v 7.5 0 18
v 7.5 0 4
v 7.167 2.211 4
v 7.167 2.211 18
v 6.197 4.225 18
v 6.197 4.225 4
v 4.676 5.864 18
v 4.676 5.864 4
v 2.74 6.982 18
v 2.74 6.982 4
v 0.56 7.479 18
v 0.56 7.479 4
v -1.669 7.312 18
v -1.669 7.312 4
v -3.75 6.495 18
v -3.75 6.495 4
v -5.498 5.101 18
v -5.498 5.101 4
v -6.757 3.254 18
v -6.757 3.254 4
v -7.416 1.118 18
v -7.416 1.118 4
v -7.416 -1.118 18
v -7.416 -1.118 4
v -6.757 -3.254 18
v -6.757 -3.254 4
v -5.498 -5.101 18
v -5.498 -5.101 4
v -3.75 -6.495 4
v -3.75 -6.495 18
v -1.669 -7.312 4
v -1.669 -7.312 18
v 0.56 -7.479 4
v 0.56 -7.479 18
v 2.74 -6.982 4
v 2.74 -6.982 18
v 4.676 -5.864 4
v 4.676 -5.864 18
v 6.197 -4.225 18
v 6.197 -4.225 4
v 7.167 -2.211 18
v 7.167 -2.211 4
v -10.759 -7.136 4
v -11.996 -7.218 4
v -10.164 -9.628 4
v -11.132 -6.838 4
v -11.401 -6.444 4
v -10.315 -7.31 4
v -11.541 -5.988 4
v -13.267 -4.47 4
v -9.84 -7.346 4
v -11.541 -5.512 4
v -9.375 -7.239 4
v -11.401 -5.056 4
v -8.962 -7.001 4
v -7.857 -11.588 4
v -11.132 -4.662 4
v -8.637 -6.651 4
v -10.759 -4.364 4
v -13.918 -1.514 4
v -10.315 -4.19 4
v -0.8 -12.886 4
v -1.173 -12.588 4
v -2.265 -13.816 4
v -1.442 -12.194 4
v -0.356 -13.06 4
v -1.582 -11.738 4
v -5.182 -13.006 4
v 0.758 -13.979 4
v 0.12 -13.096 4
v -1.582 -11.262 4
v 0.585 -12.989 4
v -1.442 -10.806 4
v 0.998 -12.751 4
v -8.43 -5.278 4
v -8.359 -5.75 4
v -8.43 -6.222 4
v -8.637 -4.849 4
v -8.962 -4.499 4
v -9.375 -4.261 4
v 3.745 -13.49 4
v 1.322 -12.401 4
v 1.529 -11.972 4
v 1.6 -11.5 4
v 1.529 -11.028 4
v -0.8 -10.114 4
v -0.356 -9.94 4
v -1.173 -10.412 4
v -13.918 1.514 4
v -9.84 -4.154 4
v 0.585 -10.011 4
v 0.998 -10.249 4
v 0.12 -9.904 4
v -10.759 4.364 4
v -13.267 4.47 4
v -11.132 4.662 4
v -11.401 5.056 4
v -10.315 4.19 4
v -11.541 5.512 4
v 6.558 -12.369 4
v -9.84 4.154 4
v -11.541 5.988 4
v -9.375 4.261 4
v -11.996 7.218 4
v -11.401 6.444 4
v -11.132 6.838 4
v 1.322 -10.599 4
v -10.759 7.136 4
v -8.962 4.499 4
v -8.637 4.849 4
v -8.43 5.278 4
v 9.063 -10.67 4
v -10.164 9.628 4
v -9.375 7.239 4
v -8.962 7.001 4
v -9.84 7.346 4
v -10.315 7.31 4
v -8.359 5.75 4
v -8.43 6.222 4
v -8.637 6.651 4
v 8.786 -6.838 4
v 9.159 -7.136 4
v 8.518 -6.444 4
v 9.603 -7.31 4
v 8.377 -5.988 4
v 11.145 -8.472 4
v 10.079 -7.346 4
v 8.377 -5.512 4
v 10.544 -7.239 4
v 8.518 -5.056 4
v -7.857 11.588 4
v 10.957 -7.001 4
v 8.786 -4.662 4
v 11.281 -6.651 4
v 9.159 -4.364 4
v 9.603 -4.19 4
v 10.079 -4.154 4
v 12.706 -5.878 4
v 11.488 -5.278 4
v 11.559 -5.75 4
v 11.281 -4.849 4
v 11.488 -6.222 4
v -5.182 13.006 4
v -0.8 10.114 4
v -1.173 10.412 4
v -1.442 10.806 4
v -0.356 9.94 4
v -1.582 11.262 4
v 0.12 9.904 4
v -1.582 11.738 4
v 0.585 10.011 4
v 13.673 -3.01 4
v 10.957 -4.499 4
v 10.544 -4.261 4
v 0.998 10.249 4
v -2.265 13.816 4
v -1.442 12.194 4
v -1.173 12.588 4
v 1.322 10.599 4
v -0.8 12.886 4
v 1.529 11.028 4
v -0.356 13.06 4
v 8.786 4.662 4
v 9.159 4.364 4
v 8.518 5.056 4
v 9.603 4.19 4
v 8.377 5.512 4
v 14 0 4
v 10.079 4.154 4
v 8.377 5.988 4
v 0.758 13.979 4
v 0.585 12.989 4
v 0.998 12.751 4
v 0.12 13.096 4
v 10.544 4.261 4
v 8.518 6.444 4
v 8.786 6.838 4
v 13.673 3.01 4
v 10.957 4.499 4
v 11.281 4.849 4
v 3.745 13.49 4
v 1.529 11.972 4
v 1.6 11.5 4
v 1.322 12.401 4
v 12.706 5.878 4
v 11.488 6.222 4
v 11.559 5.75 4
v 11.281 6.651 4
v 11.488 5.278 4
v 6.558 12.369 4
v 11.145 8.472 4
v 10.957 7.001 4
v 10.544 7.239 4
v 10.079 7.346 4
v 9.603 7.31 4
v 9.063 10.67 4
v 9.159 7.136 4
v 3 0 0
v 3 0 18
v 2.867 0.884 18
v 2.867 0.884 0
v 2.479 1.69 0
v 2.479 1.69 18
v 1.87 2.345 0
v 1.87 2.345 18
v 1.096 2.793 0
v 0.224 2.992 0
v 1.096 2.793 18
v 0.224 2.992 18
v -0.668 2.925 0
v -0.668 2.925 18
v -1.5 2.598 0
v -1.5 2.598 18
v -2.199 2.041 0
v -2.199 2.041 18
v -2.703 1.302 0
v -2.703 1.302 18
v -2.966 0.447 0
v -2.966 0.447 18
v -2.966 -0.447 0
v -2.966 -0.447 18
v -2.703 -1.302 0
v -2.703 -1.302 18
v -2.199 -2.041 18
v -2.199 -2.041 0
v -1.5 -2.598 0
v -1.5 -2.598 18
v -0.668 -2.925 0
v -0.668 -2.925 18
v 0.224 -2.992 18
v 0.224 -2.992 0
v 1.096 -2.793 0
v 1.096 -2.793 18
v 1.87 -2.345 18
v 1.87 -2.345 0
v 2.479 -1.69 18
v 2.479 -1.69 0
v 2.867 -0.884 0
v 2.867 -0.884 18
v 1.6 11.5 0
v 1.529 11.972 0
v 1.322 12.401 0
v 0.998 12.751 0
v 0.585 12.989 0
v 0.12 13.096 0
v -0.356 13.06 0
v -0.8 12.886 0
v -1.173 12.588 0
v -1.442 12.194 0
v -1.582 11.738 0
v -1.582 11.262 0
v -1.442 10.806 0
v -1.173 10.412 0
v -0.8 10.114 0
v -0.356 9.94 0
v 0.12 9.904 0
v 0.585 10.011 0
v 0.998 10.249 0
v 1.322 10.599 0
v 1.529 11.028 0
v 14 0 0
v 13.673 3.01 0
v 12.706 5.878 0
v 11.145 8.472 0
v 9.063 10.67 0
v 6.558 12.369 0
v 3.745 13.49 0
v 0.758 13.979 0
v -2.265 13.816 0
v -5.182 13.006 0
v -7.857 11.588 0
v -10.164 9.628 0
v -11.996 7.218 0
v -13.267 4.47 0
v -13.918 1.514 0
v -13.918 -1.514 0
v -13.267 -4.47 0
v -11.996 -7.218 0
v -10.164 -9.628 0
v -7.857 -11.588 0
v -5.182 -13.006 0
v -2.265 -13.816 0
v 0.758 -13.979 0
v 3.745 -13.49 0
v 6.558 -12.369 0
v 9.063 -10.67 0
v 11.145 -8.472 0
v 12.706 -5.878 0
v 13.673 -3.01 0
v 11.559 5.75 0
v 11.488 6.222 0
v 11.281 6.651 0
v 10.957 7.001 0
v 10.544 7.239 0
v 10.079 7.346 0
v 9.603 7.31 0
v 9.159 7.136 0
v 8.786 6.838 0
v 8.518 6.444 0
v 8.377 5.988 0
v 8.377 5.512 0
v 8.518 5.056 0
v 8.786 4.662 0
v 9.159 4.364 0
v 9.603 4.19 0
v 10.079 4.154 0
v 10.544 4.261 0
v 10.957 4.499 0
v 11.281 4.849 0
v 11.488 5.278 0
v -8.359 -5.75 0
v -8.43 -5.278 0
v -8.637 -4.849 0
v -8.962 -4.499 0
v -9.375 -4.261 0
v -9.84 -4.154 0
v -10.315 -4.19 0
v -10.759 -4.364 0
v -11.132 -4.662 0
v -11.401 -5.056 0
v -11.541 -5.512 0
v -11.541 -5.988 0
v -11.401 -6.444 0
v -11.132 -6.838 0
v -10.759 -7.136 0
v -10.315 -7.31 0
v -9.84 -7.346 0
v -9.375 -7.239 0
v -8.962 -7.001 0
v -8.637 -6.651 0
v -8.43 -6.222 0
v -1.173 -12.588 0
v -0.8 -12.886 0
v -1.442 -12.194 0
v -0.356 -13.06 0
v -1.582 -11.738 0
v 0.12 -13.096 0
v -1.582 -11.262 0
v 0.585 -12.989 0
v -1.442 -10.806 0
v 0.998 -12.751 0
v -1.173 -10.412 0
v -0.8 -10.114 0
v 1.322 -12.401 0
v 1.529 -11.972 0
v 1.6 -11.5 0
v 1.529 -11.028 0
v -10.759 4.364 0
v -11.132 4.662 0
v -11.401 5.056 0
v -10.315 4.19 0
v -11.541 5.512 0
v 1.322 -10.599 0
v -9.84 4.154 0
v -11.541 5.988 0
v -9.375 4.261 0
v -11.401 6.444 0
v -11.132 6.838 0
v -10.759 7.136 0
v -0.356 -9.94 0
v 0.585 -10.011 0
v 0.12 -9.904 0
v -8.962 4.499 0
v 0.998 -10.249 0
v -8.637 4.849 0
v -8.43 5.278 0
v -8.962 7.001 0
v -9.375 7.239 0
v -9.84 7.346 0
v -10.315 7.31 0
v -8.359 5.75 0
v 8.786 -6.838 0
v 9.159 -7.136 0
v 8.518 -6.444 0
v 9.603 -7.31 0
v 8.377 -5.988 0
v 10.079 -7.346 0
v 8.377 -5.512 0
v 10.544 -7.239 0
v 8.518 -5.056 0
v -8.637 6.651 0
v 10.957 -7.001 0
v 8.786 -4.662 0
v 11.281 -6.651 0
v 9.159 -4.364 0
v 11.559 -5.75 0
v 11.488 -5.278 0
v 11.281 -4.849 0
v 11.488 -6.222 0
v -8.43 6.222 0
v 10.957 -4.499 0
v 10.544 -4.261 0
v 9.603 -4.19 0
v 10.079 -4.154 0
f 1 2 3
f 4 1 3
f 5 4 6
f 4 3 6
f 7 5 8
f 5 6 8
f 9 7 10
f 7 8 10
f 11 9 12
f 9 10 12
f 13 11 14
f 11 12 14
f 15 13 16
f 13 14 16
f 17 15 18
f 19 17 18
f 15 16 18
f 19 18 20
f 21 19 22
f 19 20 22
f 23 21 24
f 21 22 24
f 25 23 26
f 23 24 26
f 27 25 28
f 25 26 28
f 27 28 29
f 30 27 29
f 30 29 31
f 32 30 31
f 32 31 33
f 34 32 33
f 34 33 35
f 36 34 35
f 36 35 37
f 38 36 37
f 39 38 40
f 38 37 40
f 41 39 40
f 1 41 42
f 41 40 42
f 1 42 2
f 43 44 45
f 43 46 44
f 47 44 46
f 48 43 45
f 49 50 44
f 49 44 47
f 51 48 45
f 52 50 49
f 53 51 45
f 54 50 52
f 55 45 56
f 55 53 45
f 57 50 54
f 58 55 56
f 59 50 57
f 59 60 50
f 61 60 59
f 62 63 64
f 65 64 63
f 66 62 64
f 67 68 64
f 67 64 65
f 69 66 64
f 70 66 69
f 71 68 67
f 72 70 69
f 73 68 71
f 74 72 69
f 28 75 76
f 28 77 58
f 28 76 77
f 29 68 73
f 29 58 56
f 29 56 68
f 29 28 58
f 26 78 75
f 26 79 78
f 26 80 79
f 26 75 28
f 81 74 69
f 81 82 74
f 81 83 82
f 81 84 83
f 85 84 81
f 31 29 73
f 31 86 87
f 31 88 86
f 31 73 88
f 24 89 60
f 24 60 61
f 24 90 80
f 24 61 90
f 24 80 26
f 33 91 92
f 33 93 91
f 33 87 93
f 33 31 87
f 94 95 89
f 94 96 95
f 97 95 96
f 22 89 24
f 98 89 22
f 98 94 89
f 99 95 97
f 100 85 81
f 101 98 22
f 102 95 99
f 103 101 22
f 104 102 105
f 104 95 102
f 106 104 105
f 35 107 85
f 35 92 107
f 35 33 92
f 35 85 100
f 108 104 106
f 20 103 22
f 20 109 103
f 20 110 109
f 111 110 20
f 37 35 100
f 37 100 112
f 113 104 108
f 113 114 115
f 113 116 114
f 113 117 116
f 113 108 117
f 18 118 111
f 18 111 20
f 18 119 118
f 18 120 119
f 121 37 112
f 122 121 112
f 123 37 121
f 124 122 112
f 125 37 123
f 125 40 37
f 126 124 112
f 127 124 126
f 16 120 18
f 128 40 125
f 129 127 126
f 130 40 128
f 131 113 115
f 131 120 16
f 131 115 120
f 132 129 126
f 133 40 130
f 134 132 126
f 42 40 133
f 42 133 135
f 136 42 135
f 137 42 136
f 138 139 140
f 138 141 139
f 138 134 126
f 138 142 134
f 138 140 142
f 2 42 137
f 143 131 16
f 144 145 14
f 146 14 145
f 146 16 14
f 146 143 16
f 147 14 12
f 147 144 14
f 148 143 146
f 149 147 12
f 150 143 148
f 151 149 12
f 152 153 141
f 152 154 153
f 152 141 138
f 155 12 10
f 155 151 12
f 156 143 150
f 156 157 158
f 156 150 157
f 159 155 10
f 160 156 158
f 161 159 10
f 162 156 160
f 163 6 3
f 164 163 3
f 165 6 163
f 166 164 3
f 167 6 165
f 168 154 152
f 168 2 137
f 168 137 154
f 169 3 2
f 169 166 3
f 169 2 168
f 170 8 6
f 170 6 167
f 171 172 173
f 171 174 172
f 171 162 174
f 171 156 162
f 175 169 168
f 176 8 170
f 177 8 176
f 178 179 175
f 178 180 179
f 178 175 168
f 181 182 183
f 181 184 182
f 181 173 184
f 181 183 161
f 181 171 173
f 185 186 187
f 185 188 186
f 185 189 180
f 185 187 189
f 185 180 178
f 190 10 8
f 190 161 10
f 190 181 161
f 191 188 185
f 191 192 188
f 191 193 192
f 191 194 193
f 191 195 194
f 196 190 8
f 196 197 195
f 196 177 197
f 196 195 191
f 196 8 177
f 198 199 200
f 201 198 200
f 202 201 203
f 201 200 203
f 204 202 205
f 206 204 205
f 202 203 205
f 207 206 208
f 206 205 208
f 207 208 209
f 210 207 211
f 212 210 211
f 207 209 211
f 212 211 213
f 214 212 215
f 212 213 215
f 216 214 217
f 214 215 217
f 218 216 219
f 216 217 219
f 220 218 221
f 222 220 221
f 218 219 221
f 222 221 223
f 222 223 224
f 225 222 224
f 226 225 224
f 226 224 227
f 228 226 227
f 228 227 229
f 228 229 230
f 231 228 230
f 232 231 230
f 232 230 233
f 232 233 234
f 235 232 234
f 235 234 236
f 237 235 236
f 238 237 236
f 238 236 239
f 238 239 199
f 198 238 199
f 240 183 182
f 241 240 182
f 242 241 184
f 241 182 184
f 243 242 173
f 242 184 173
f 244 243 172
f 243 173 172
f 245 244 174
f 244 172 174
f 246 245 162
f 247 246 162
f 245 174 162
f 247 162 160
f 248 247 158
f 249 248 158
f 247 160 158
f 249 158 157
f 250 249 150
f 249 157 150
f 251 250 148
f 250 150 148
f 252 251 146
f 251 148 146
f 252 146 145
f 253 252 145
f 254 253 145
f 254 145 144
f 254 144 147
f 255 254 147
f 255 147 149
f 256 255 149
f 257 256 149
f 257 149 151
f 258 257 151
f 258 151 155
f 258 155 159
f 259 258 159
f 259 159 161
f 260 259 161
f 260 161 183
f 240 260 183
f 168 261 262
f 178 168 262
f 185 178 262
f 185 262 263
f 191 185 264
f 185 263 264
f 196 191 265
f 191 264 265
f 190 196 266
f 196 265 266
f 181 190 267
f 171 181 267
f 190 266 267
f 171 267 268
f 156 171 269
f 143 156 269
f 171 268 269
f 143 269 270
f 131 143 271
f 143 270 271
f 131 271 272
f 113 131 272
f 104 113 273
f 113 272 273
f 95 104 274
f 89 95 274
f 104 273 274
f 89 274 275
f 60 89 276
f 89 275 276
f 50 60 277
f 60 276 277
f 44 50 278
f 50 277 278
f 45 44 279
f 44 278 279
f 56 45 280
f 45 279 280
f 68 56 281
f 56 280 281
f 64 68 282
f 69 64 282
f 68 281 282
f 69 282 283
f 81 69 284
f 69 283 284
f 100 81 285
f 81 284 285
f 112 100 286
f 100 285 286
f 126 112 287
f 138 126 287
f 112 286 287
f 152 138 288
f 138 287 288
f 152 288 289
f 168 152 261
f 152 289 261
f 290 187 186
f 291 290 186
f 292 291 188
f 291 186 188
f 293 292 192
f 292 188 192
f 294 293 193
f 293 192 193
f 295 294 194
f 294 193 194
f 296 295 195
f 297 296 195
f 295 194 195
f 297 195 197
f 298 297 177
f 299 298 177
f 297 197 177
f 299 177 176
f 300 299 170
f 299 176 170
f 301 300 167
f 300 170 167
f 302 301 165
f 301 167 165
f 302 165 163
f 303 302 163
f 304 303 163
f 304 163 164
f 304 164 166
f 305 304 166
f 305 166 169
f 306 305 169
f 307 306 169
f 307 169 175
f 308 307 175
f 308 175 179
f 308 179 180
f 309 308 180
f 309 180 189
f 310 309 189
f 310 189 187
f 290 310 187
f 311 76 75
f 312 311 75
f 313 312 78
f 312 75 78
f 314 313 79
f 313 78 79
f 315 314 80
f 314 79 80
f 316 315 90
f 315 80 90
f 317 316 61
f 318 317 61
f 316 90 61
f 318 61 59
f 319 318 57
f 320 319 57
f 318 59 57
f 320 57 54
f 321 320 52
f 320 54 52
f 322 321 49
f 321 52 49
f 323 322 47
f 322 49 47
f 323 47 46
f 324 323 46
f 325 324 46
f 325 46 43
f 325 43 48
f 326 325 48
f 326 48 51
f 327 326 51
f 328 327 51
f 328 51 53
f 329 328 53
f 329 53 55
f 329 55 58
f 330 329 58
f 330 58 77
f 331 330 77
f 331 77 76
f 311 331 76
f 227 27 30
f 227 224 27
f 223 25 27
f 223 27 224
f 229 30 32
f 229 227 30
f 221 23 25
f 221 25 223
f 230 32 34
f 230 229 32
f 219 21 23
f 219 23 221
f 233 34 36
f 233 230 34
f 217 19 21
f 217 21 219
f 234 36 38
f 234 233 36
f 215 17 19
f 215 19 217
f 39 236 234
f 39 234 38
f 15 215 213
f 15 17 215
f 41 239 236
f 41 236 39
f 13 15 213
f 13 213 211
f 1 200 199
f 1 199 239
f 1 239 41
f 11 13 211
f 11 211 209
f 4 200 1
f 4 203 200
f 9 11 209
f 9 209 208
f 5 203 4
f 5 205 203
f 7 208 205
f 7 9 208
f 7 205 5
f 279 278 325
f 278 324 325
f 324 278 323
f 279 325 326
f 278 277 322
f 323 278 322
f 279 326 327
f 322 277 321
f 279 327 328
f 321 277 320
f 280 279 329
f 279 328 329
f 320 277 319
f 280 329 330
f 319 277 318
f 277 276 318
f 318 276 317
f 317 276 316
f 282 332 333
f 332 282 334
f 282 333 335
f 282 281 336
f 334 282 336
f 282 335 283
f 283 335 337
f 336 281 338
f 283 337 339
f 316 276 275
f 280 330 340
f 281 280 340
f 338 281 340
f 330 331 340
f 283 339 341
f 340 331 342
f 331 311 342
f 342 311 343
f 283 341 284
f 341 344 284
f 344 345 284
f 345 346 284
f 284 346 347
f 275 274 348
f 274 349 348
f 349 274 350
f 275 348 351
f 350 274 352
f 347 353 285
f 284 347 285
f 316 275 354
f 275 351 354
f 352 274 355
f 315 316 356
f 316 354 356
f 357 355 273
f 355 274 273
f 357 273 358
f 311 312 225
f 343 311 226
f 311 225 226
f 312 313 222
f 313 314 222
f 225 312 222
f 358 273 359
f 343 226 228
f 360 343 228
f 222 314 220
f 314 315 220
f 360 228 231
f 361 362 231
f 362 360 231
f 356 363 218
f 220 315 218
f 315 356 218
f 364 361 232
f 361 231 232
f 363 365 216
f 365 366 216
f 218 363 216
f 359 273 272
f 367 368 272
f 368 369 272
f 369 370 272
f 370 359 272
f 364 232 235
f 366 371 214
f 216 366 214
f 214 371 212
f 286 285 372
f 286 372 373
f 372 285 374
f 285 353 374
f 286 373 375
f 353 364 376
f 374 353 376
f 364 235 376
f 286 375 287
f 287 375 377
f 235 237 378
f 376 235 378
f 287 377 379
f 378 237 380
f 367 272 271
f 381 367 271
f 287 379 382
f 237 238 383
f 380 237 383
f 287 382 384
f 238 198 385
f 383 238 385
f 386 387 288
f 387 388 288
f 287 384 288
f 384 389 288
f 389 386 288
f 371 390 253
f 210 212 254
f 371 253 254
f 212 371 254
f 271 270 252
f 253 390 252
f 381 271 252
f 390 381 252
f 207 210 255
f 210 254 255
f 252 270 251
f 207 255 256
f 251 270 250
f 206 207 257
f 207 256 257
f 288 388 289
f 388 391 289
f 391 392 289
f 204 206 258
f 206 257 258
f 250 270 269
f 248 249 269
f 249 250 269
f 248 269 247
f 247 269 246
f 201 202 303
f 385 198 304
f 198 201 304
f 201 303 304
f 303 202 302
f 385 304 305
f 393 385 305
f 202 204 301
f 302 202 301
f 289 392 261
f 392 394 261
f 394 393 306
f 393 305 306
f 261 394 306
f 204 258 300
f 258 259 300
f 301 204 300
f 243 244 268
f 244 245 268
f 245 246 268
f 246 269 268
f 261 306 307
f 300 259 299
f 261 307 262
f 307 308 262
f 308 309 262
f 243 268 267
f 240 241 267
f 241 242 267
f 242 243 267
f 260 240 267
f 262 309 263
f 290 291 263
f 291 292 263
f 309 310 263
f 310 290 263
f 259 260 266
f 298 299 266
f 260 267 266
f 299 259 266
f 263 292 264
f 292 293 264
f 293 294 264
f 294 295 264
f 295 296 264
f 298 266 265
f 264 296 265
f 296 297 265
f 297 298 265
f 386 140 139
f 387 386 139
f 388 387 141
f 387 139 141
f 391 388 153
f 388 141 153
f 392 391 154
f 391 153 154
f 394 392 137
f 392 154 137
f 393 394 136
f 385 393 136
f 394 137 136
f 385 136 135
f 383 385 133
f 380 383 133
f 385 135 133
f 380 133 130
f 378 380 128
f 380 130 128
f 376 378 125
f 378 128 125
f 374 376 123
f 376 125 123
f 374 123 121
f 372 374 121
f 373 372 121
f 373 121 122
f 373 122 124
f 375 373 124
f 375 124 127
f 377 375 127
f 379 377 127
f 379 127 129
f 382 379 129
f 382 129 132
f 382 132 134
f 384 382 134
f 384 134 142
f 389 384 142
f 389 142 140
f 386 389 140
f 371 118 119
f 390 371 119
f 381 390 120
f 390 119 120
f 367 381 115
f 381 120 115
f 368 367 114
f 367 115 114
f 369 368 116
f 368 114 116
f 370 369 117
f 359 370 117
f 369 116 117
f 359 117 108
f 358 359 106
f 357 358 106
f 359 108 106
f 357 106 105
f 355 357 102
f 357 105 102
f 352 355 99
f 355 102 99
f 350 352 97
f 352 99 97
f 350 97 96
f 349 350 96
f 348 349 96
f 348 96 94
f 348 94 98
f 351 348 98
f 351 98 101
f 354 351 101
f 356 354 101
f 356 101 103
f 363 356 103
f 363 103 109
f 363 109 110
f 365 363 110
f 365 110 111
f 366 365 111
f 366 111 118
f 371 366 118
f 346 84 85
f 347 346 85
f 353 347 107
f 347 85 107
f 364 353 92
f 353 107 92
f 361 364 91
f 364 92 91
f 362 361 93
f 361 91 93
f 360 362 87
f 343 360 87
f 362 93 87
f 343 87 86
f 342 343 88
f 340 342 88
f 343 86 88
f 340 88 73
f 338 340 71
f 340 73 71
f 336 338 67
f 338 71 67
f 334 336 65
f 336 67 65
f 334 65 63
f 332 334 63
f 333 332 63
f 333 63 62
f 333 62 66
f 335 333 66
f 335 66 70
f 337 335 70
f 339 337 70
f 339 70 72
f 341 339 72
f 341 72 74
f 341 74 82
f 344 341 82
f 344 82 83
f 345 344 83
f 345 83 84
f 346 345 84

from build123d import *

# Parameters (mm, degrees)
SKETCH_1_R          = 14
EXTRUDE_1_DEPTH     = 4
SKETCH_2_R          = 7.5
EXTRUDE_2_DEPTH     = 14
CUT_EXTRUDE_1_REACH = 28.758
SKETCH_3_R          = 3
CUT_EXTRUDE_2_REACH = 26.249
SKETCH_4_R          = 1.6


with BuildPart() as part:
    # 草图1 → 凸台-拉伸1 (new body)
    with BuildSketch(Plane.XY):
        Circle(SKETCH_1_R)
    extrude(amount=EXTRUDE_1_DEPTH)

    # 草图2 → 凸台-拉伸2 (add)
    with BuildSketch(Plane.XY.offset(4)):
        Circle(SKETCH_2_R)
    extrude(amount=EXTRUDE_2_DEPTH)

    # 草图3 → 切除-拉伸1 (cut, up to next)
    with BuildSketch(Plane.XY.offset(18), mode=Mode.PRIVATE) as cut_extrude_1_sk1:
        Circle(SKETCH_3_R)
    cut_extrude_1_tool1 = extrude(cut_extrude_1_sk1.sketch, amount=-CUT_EXTRUDE_1_REACH, mode=Mode.PRIVATE) & part.part
    add(cut_extrude_1_tool1.solids().sort_by_distance((0, 0, 18))[0], mode=Mode.SUBTRACT)

    # 草图4 → 切除-拉伸2 (cut, up to next)
    with BuildSketch(Plane.XY.offset(4), mode=Mode.PRIVATE) as cut_extrude_2_sk1:
        with Locations((0, 11.5)):
            Circle(SKETCH_4_R)
    cut_extrude_2_tool1 = extrude(cut_extrude_2_sk1.sketch, amount=-CUT_EXTRUDE_2_REACH, mode=Mode.PRIVATE) & part.part
    # 草图4 → 切除-拉伸2 (cut, up to next)
    with BuildSketch(Plane.XY.offset(4), mode=Mode.PRIVATE) as cut_extrude_2_sk2:
        with Locations((9.959292144, 5.75)):
            Circle(SKETCH_4_R)
    cut_extrude_2_tool2 = extrude(cut_extrude_2_sk2.sketch, amount=-CUT_EXTRUDE_2_REACH, mode=Mode.PRIVATE) & part.part
    # 草图4 → 切除-拉伸2 (cut, up to next)
    with BuildSketch(Plane.XY.offset(4), mode=Mode.PRIVATE) as cut_extrude_2_sk3:
        with Locations((9.959292144, -5.75)):
            Circle(SKETCH_4_R)
    cut_extrude_2_tool3 = extrude(cut_extrude_2_sk3.sketch, amount=-CUT_EXTRUDE_2_REACH, mode=Mode.PRIVATE) & part.part
    # 草图4 → 切除-拉伸2 (cut, up to next)
    with BuildSketch(Plane.XY.offset(4), mode=Mode.PRIVATE) as cut_extrude_2_sk4:
        with Locations((0, -11.5)):
            Circle(SKETCH_4_R)
    cut_extrude_2_tool4 = extrude(cut_extrude_2_sk4.sketch, amount=-CUT_EXTRUDE_2_REACH, mode=Mode.PRIVATE) & part.part
    # 草图4 → 切除-拉伸2 (cut, up to next)
    with BuildSketch(Plane.XY.offset(4), mode=Mode.PRIVATE) as cut_extrude_2_sk5:
        with Locations((-9.959292144, -5.75)):
            Circle(SKETCH_4_R)
    cut_extrude_2_tool5 = extrude(cut_extrude_2_sk5.sketch, amount=-CUT_EXTRUDE_2_REACH, mode=Mode.PRIVATE) & part.part
    # 草图4 → 切除-拉伸2 (cut, up to next)
    with BuildSketch(Plane.XY.offset(4), mode=Mode.PRIVATE) as cut_extrude_2_sk6:
        with Locations((-9.959292144, 5.75)):
            Circle(SKETCH_4_R)
    cut_extrude_2_tool6 = extrude(cut_extrude_2_sk6.sketch, amount=-CUT_EXTRUDE_2_REACH, mode=Mode.PRIVATE) & part.part
    add(cut_extrude_2_tool1.solids().sort_by_distance((0, 11.5, 4))[0], mode=Mode.SUBTRACT)
    add(cut_extrude_2_tool2.solids().sort_by_distance((9.959292, 5.75, 4))[0], mode=Mode.SUBTRACT)
    add(cut_extrude_2_tool3.solids().sort_by_distance((9.959292, -5.75, 4))[0], mode=Mode.SUBTRACT)
    add(cut_extrude_2_tool4.solids().sort_by_distance((0, -11.5, 4))[0], mode=Mode.SUBTRACT)
    add(cut_extrude_2_tool5.solids().sort_by_distance((-9.959292, -5.75, 4))[0], mode=Mode.SUBTRACT)
    add(cut_extrude_2_tool6.solids().sort_by_distance((-9.959292, 5.75, 4))[0], mode=Mode.SUBTRACT)


solid = part.part
